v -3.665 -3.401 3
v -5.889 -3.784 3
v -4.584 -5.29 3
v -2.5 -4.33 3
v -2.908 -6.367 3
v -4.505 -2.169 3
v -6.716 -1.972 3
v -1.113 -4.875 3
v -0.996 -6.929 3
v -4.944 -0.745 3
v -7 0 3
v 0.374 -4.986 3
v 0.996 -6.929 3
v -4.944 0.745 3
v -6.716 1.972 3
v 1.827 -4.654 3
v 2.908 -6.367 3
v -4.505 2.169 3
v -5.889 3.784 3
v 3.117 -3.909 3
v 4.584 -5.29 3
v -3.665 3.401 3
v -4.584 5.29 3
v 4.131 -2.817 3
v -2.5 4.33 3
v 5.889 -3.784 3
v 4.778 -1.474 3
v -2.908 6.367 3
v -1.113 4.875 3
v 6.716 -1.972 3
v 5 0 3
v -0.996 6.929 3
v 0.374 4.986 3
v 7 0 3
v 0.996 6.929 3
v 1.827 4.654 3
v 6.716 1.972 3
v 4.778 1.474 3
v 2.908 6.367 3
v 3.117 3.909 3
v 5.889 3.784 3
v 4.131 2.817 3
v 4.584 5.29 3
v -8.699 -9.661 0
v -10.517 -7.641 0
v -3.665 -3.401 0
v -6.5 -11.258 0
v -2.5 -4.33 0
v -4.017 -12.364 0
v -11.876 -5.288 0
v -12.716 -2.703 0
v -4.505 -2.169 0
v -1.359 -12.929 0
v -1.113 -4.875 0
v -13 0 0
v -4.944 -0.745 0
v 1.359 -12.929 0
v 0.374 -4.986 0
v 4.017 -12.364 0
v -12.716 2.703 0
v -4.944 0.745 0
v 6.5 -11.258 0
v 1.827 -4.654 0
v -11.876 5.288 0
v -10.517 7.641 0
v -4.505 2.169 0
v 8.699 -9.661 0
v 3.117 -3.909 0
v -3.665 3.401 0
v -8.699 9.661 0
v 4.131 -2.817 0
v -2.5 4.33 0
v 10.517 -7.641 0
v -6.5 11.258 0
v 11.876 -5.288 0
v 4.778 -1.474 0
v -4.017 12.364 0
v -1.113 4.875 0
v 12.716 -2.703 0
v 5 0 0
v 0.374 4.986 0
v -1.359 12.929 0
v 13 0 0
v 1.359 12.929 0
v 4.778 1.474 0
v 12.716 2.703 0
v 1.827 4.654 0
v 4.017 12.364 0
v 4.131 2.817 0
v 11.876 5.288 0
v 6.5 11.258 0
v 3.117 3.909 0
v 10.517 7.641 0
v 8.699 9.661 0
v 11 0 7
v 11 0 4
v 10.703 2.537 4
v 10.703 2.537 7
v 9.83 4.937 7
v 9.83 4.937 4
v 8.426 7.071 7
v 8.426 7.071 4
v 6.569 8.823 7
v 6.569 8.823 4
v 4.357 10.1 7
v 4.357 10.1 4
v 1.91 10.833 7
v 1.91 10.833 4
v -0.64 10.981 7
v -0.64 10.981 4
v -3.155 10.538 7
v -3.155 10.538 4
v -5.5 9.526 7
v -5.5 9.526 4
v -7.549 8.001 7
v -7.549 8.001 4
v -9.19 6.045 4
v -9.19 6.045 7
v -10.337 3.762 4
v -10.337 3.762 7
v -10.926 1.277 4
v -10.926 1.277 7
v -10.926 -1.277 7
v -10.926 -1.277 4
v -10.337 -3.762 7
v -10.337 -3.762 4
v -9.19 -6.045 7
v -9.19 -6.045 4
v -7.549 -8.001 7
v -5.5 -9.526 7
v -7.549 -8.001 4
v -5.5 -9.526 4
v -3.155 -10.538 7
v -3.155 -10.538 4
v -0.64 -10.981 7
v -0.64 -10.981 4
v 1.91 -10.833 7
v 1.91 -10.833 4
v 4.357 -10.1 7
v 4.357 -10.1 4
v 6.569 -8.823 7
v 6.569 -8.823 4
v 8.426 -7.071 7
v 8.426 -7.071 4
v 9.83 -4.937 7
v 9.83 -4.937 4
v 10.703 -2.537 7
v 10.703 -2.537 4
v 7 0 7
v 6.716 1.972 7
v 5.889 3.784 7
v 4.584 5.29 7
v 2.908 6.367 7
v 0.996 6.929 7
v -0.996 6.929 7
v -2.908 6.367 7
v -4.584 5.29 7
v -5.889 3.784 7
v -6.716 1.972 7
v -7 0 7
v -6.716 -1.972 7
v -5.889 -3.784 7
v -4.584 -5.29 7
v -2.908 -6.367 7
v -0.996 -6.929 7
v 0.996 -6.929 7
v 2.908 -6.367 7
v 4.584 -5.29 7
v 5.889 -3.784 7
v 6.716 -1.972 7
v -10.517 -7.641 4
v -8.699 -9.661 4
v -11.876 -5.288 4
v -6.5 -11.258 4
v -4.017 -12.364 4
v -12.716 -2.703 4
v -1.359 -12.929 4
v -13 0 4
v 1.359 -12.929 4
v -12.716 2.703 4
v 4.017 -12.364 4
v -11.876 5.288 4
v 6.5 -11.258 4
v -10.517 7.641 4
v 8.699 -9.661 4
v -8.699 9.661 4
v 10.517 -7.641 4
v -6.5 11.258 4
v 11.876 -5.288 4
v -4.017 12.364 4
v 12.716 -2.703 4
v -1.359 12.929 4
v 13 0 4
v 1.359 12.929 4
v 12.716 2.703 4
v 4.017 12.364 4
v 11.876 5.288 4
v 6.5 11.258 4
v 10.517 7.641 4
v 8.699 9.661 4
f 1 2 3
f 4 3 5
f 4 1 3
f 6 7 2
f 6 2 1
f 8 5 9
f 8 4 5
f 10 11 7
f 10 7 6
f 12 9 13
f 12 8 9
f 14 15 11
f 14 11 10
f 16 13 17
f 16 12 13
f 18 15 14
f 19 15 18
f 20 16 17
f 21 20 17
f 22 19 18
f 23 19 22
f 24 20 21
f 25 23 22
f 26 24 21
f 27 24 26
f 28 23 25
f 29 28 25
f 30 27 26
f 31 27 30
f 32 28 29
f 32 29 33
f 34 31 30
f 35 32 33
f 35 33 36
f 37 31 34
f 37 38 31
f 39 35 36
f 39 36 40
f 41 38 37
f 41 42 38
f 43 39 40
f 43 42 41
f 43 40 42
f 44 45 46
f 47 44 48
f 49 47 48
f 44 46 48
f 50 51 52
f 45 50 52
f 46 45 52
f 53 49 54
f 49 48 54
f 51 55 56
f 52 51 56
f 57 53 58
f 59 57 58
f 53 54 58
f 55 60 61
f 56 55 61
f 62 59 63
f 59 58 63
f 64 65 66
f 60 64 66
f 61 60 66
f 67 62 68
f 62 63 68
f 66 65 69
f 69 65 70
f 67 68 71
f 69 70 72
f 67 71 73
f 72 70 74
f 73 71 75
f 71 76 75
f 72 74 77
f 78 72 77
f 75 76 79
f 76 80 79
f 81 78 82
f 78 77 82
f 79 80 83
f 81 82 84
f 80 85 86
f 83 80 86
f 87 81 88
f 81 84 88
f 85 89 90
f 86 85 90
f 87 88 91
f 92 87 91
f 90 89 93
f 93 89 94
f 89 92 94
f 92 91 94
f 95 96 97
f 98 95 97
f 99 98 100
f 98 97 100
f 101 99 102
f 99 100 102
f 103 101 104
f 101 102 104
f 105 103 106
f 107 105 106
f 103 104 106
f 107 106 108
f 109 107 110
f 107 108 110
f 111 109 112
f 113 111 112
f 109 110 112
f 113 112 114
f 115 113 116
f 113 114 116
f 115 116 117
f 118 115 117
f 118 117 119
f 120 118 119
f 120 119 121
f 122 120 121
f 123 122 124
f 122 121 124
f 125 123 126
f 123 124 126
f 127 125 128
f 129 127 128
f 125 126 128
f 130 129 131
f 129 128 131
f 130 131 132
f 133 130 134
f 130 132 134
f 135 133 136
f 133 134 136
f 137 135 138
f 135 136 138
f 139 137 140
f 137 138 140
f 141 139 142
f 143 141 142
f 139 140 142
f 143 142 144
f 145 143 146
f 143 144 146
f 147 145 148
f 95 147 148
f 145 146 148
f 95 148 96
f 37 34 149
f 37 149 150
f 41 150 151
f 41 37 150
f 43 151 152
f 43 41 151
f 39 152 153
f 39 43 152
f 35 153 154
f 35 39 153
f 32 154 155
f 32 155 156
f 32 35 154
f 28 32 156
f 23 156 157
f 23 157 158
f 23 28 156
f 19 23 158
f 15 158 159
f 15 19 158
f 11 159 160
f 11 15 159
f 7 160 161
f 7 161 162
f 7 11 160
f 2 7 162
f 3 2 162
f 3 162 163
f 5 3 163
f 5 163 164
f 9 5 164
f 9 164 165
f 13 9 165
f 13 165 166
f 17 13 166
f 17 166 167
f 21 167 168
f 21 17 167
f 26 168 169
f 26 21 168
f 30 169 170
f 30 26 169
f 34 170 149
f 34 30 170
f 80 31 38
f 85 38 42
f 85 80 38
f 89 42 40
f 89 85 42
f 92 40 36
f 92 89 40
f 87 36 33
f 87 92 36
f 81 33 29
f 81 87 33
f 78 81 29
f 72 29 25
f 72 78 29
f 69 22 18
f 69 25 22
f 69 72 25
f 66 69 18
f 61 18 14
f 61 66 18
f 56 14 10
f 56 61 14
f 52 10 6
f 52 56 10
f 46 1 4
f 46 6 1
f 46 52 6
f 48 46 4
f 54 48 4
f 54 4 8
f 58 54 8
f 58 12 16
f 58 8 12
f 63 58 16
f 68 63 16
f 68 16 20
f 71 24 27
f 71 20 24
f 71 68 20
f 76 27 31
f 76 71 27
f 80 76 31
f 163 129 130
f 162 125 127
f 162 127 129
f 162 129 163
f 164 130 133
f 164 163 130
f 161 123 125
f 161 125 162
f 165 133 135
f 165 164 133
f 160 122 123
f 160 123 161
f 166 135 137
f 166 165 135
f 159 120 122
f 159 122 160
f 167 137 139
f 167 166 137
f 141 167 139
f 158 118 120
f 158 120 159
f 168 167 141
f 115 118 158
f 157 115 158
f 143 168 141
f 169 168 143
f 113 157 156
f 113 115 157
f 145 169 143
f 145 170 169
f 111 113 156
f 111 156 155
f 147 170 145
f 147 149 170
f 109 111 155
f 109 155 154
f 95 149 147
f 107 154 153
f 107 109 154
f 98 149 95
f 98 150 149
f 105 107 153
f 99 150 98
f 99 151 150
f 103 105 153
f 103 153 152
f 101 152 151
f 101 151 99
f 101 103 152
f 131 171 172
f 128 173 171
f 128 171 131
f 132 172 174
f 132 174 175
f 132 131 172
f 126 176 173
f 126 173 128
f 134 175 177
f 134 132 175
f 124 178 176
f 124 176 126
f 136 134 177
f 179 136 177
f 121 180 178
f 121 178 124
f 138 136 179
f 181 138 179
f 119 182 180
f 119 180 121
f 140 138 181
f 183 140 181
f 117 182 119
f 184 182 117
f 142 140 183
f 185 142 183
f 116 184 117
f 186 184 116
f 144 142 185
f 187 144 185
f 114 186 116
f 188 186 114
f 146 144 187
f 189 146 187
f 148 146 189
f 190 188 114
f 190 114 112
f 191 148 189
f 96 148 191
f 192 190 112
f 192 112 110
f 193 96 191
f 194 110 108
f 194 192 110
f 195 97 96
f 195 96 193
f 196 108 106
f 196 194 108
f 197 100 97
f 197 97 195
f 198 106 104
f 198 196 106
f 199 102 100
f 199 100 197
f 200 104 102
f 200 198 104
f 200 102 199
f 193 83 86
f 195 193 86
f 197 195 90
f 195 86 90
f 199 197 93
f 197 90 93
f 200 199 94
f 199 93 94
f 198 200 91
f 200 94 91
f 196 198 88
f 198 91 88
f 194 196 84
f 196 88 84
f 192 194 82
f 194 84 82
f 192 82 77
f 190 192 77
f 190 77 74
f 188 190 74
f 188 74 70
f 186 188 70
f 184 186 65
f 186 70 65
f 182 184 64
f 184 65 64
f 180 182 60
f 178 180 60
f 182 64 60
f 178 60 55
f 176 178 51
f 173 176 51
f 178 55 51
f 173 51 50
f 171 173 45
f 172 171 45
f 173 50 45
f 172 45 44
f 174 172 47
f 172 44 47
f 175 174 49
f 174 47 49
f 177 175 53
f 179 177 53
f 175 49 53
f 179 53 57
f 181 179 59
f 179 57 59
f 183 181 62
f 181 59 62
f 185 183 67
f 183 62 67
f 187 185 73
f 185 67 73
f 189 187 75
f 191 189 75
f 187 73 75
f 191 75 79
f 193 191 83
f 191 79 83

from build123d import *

# Parameters (mm, degrees)
CYLINDER003_R     = 7
CYLINDER003_DEPTH = 4
CYLINDER002_R     = 5
CYLINDER002_DEPTH = 7
CYLINDER001_R     = 11
CYLINDER001_DEPTH = 3
CYLINDER_R        = 13
CYLINDER_DEPTH    = 4


with BuildPart() as cilindro003:
    # Cylinder003 → Cylinder003 (new body)
    with BuildSketch(Plane.XY.offset(3)):
        Circle(CYLINDER003_R)
    extrude(amount=CYLINDER003_DEPTH)


with BuildPart() as cilindro002:
    # Cylinder002 → Cylinder002 (new body)
    with BuildSketch(Plane.XY):
        Circle(CYLINDER002_R)
    extrude(amount=CYLINDER002_DEPTH)


with BuildPart() as cilindro001:
    # Cylinder001 → Cylinder001 (new body)
    with BuildSketch(Plane.XY.offset(4)):
        Circle(CYLINDER001_R)
    extrude(amount=CYLINDER001_DEPTH)


with BuildPart() as cut001:
    # Cylinder → Cylinder (new body)
    with BuildSketch(Plane.XY):
        Circle(CYLINDER_R)
    extrude(amount=CYLINDER_DEPTH)

    # Fusion: union Cilindro001
    add(cilindro001.part)

    # Cut: cut Cilindro002
    add(cilindro002.part, mode=Mode.SUBTRACT)

    # Cut001: cut Cilindro003
    add(cilindro003.part, mode=Mode.SUBTRACT)


solid = cut001.part
